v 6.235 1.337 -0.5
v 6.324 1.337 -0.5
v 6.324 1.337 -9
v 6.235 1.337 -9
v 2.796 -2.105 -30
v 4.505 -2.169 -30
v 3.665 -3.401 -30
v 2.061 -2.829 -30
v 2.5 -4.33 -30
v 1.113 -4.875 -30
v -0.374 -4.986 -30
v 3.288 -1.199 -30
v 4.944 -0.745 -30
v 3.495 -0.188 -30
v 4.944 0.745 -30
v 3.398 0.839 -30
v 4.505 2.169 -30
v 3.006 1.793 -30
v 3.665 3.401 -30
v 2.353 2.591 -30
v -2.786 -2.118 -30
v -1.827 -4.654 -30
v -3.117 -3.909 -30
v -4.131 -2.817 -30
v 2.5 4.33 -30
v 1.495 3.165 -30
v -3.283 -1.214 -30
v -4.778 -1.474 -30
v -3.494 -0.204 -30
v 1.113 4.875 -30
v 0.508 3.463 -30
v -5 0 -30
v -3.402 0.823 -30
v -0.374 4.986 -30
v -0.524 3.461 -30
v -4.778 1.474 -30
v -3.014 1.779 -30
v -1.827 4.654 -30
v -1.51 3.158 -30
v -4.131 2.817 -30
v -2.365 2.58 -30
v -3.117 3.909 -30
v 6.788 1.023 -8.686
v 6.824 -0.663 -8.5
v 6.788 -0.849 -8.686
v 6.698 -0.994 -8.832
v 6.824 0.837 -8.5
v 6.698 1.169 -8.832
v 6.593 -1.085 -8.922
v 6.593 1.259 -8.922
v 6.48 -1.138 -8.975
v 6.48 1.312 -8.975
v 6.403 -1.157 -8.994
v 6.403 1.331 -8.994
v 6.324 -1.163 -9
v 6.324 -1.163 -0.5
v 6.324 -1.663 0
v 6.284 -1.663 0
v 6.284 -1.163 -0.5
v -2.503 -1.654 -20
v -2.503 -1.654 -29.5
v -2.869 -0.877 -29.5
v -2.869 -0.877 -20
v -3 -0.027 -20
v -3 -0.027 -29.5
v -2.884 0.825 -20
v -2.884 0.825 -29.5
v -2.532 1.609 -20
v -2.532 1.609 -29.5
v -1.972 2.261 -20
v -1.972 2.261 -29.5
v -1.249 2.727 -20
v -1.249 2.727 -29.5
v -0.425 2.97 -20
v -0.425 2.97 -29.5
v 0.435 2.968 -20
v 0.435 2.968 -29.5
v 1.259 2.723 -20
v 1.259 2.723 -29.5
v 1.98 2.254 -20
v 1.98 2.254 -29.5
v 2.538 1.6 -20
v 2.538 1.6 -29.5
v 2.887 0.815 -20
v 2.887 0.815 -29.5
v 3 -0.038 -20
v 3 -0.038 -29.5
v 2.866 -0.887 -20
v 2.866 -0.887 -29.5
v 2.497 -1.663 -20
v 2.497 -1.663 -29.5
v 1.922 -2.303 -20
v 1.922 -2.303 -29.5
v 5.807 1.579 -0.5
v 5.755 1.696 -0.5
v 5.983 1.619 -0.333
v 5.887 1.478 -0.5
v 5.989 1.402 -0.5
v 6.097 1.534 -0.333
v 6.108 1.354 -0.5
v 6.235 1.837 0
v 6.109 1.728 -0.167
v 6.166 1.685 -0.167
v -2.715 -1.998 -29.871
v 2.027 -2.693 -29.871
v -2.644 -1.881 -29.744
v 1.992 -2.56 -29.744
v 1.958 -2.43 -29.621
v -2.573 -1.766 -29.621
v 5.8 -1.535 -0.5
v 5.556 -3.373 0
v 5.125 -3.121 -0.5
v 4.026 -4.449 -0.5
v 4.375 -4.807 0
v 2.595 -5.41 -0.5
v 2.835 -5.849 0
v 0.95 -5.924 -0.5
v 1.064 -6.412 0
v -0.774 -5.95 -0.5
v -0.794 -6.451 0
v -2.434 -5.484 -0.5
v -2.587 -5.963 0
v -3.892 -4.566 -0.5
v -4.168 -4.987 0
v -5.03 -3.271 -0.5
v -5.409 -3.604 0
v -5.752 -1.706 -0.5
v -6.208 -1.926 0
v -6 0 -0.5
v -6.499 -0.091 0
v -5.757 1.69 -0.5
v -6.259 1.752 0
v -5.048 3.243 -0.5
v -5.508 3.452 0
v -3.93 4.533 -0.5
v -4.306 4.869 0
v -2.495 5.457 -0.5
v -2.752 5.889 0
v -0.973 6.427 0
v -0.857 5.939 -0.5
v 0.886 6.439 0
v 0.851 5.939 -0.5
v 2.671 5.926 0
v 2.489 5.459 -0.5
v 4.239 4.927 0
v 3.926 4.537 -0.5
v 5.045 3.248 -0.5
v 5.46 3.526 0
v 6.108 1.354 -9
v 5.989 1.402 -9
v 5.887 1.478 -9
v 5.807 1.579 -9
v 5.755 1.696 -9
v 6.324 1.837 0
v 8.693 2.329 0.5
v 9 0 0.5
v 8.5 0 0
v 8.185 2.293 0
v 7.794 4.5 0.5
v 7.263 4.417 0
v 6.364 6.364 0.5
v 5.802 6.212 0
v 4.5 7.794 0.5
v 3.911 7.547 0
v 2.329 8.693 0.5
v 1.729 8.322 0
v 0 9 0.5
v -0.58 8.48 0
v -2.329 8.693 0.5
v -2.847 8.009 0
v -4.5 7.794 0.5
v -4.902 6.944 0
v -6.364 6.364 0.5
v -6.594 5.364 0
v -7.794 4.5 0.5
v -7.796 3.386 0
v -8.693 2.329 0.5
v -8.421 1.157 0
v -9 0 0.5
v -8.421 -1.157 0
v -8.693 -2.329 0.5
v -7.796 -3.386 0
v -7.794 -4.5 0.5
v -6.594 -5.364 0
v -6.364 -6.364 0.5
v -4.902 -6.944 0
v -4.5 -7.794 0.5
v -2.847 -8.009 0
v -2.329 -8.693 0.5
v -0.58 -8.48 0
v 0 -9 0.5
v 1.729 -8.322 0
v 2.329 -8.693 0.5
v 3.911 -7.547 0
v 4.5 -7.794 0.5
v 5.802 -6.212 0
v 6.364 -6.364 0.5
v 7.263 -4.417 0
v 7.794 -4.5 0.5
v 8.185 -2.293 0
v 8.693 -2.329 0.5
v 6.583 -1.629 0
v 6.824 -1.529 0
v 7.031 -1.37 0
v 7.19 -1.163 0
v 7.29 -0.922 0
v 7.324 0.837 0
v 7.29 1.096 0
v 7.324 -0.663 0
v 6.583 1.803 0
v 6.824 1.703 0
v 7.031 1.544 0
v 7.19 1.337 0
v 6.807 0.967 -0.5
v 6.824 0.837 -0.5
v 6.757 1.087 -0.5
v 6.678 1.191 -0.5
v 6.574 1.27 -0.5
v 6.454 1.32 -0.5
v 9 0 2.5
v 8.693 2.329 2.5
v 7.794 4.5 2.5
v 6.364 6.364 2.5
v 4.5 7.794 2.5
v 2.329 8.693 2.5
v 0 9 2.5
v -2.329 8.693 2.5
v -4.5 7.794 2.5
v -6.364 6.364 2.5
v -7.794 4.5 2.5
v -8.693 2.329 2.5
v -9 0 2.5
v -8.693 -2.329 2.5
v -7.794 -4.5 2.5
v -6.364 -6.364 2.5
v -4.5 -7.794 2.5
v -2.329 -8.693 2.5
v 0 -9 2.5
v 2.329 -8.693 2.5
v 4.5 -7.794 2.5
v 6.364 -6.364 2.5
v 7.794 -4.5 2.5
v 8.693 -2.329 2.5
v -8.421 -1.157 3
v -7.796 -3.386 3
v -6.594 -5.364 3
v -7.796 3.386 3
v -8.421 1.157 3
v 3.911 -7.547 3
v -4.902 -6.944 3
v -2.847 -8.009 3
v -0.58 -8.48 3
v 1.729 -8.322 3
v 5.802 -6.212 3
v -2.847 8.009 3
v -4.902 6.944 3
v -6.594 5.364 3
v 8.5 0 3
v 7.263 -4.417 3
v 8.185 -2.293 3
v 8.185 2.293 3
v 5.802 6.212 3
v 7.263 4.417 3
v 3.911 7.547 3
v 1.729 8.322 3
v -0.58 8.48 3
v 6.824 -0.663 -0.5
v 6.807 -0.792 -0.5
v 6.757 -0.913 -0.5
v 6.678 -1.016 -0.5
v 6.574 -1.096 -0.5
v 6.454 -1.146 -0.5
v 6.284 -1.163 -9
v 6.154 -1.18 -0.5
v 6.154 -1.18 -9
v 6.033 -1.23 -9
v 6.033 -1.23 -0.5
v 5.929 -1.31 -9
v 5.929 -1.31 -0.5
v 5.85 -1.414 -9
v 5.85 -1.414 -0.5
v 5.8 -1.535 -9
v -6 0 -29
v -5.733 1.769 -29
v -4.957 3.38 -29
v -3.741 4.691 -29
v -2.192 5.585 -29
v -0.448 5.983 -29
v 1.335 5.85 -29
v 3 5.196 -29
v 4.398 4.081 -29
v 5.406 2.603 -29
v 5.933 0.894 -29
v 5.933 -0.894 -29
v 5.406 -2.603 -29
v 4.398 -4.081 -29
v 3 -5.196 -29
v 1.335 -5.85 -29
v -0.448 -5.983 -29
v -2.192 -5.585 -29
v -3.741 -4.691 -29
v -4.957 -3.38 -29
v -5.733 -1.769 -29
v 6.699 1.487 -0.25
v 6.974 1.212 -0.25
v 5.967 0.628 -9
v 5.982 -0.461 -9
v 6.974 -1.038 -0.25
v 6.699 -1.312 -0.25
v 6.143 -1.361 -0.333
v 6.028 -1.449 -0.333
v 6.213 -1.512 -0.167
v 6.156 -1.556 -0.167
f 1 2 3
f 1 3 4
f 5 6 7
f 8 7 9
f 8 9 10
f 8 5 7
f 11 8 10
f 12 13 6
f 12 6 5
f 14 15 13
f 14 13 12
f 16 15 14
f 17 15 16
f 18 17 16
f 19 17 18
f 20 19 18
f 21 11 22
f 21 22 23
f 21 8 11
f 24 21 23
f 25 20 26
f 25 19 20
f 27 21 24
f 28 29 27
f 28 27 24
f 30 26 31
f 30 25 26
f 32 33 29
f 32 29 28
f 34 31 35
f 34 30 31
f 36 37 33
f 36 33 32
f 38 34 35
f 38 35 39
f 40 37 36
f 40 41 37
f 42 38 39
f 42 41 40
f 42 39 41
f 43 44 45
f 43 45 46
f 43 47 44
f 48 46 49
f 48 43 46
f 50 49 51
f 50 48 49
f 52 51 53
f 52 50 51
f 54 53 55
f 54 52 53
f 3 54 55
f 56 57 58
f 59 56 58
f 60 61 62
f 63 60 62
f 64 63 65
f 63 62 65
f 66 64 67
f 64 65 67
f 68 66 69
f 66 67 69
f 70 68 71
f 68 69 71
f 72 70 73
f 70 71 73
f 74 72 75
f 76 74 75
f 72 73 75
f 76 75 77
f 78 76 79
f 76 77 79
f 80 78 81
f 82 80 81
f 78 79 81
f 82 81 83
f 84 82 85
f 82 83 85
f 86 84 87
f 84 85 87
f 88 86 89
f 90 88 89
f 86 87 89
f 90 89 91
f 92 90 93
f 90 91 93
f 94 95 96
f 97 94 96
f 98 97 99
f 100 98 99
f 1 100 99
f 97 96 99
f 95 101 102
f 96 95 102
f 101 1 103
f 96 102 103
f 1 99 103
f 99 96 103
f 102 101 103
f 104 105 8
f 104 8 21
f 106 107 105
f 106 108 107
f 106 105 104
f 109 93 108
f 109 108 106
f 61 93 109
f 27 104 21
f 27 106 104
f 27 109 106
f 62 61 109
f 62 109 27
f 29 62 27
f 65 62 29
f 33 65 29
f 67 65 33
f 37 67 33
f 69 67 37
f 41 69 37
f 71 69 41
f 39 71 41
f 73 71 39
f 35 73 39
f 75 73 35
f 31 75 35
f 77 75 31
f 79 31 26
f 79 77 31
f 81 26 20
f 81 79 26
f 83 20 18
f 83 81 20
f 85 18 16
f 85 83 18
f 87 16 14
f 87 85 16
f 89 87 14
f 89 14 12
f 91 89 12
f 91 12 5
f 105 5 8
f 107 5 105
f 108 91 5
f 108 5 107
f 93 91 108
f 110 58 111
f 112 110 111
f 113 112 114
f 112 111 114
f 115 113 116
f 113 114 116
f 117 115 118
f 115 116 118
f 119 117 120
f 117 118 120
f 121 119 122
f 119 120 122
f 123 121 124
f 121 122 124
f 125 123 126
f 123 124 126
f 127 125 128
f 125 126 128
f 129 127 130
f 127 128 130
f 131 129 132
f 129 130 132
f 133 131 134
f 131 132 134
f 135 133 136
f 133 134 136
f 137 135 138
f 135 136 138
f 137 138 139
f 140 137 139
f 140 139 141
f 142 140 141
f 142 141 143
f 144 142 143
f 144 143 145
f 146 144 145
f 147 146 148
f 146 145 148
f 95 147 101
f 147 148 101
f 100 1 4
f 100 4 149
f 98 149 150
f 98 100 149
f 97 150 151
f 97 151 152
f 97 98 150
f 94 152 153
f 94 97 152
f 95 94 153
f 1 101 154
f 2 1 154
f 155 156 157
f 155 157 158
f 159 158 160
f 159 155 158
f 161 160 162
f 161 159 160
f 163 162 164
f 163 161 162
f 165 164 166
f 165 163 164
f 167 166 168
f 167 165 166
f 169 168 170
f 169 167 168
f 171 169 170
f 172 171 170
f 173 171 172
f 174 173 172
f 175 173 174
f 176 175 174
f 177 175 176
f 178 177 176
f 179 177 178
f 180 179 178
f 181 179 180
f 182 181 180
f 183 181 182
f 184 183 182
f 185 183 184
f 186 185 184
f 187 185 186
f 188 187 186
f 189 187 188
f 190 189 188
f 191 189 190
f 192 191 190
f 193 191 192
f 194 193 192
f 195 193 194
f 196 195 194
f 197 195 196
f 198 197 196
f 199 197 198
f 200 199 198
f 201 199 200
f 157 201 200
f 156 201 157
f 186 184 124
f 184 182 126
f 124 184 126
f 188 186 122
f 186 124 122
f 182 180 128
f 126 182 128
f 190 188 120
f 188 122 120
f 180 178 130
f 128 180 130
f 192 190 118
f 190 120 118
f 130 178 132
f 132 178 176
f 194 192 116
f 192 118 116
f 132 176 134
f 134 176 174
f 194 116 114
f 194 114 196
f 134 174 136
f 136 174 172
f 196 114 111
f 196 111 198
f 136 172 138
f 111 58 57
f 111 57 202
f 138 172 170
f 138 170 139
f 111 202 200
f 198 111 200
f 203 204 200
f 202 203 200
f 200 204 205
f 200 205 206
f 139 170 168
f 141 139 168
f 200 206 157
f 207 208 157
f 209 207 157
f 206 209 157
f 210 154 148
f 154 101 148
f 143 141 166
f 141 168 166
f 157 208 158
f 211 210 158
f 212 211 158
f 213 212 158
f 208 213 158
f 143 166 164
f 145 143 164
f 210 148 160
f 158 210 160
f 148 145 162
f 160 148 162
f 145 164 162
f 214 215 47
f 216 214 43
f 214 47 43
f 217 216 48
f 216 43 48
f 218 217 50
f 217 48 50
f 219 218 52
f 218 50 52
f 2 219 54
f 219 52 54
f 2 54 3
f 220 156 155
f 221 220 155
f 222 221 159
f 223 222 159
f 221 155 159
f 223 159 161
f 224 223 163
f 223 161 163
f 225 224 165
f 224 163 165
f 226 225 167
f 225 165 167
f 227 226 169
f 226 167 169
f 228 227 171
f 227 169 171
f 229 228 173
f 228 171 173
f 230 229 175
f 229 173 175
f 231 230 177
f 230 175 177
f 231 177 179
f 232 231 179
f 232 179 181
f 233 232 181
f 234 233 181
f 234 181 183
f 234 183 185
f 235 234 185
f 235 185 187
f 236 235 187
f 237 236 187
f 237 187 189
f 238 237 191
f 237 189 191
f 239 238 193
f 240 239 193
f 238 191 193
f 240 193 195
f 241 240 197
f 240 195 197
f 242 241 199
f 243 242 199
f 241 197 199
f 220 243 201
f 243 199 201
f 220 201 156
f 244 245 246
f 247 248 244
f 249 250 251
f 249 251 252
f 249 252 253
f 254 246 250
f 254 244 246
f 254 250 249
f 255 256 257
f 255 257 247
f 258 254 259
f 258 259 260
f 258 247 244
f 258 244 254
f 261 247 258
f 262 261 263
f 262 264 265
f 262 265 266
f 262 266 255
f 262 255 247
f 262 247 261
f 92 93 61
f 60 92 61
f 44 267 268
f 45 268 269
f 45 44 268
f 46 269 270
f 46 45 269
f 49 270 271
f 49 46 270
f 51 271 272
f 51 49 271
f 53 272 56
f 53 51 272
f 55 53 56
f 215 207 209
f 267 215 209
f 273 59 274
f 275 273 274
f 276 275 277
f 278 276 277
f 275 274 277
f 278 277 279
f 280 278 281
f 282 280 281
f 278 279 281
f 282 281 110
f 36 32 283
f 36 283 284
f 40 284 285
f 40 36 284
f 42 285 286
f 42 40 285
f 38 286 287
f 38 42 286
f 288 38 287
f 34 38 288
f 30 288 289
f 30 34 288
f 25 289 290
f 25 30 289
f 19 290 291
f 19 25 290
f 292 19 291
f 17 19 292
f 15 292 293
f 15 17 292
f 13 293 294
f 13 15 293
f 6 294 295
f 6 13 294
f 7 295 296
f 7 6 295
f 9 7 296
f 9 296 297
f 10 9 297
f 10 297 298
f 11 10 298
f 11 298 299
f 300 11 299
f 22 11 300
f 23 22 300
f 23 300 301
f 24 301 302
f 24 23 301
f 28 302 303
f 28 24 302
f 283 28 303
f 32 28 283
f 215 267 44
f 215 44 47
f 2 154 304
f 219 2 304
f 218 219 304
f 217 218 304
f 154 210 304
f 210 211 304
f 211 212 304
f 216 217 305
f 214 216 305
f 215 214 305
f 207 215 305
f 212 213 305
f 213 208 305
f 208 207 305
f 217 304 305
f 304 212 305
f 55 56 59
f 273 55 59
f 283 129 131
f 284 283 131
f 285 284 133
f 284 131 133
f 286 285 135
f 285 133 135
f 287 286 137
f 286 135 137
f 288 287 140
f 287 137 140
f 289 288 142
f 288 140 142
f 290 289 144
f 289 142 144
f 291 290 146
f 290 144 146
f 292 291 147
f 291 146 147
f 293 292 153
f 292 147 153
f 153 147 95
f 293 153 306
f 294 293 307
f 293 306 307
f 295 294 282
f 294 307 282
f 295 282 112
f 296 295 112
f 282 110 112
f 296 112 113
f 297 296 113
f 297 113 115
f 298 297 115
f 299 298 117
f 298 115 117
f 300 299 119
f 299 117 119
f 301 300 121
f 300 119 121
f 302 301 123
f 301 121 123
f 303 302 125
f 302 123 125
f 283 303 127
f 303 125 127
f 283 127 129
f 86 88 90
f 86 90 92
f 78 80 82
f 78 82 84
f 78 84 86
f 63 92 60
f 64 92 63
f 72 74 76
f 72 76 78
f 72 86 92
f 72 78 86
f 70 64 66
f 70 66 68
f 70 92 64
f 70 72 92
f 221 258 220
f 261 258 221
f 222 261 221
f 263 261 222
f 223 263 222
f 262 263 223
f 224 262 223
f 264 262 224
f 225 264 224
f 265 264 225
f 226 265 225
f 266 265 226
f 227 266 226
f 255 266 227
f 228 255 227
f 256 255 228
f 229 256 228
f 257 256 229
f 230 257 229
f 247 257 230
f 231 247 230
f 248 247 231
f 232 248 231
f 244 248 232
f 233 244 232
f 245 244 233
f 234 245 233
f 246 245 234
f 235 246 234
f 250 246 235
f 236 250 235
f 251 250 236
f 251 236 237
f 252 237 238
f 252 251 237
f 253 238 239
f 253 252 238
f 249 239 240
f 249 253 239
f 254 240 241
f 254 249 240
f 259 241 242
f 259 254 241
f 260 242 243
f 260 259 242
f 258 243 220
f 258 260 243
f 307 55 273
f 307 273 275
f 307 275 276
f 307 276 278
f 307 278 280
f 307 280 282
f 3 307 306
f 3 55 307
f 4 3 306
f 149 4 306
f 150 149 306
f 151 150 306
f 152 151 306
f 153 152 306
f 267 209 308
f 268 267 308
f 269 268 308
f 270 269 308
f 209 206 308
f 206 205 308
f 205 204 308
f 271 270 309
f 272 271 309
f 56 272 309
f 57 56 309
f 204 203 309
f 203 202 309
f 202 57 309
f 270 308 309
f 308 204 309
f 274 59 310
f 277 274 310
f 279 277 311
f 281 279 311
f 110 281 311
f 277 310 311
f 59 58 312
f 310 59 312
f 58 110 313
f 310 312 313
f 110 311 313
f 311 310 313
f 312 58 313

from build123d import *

# Parameters (mm, degrees)
SKETCH1_R           = 9
BOSS_EXTRUDE1_DEPTH = 3
SKETCH2_R           = 6
BOSS_EXTRUDE2_DEPTH = 30
SKETCH3_W           = 1.649682621
SKETCH3_H           = 2.5
BOSS_EXTRUDE3_DEPTH = 9
FILLET1_R           = 0.5
CHAMFER1_SIZE       = 0.5
CHAMFER2_SIZE       = 1
CUT_EXTRUDE1_DEPTH  = 10
CHAMFER3_SIZE       = 0.5


with BuildPart() as part:
    # Sketch1 → Boss-Extrude1 (new body)
    with BuildSketch(Plane.XY):
        Circle(SKETCH1_R)
    extrude(amount=BOSS_EXTRUDE1_DEPTH)

    # Sketch2 → Boss-Extrude2 (add)
    with BuildSketch(Plane(origin=(0, 0, 0), x_dir=(-1, 0, 0), z_dir=(0, 0, -1))):
        Circle(SKETCH2_R)
    extrude(amount=BOSS_EXTRUDE2_DEPTH)

    # Sketch3 → Boss-Extrude3 (add)
    with BuildSketch(Plane(origin=(0, 0, 0), x_dir=(-1, 0, 0), z_dir=(0, 0, -1))):
        with Locations((-5.999366701, 0.087173351)):
            Rectangle(SKETCH3_W, SKETCH3_H)
    extrude(amount=BOSS_EXTRUDE3_DEPTH)

    # Fillet1
    fillet1_edges = [part.edges().sort_by_distance(p)[0] for p in [
        (5.849099711, 1.337173351, -4.5),
        (5.886241091, -1.162826649, -4.5),
        (6.824208011, -1.162826649, -4.5),
        (6.824208011, 1.337173351, -4.5),
        (6.824208011, 0.087173351, -9),
    ]]
    fillet(fillet1_edges, radius=FILLET1_R)

    # Chamfer1
    chamfer1_edges = [part.edges().sort_by_distance(p)[0] for p in [
        (-9, 0, 0),
        (6.303958853, -1.162826649, 0),
        (-0.773923618, -5.949877497, 0),
        (6.824208011, 0.087173351, 0),
        (6.279586727, 1.337173351, 0),
        (5.935516377, 1.436760743, 0),
        (5.978713688, -1.266622868, 0),
        (6.677761402, -1.016380039, 0),
        (6.677761402, 1.190726742, 0),
        (-9, 0, 3),
    ]]
    chamfer(chamfer1_edges, length=CHAMFER1_SIZE - 0.0001)  # a hair under: the kernel refuses the full size

    # Chamfer2
    chamfer2_edges = [part.edges().sort_by_distance(p)[0] for p in [
        (6, 0, -30),
    ]]
    chamfer(chamfer2_edges, length=CHAMFER2_SIZE)

    # Sketch4 → Cut-Extrude1 (cut)
    with BuildSketch(Plane(origin=(0, 0, -30), x_dir=(-1, 0, 0), z_dir=(0, 0, -1))):
        with BuildLine():
            Line((-1.922298895, -2.303207971), (2.50253525, -1.654484005))
            ThreePointArc((2.50253525, -1.654484005), (-0.435177266, 2.968268982), (-1.922298895, -2.303207971))
        make_face()
    extrude(amount=-CUT_EXTRUDE1_DEPTH, mode=Mode.SUBTRACT)

    # Chamfer3
    chamfer3_edges = [part.edges().sort_by_distance(p)[0] for p in [
        (0.435177266, 2.968268982, -30),
        (-0.290118177, -1.978845988, -30),
    ]]
    chamfer(chamfer3_edges, length=CHAMFER3_SIZE)


solid = part.part
